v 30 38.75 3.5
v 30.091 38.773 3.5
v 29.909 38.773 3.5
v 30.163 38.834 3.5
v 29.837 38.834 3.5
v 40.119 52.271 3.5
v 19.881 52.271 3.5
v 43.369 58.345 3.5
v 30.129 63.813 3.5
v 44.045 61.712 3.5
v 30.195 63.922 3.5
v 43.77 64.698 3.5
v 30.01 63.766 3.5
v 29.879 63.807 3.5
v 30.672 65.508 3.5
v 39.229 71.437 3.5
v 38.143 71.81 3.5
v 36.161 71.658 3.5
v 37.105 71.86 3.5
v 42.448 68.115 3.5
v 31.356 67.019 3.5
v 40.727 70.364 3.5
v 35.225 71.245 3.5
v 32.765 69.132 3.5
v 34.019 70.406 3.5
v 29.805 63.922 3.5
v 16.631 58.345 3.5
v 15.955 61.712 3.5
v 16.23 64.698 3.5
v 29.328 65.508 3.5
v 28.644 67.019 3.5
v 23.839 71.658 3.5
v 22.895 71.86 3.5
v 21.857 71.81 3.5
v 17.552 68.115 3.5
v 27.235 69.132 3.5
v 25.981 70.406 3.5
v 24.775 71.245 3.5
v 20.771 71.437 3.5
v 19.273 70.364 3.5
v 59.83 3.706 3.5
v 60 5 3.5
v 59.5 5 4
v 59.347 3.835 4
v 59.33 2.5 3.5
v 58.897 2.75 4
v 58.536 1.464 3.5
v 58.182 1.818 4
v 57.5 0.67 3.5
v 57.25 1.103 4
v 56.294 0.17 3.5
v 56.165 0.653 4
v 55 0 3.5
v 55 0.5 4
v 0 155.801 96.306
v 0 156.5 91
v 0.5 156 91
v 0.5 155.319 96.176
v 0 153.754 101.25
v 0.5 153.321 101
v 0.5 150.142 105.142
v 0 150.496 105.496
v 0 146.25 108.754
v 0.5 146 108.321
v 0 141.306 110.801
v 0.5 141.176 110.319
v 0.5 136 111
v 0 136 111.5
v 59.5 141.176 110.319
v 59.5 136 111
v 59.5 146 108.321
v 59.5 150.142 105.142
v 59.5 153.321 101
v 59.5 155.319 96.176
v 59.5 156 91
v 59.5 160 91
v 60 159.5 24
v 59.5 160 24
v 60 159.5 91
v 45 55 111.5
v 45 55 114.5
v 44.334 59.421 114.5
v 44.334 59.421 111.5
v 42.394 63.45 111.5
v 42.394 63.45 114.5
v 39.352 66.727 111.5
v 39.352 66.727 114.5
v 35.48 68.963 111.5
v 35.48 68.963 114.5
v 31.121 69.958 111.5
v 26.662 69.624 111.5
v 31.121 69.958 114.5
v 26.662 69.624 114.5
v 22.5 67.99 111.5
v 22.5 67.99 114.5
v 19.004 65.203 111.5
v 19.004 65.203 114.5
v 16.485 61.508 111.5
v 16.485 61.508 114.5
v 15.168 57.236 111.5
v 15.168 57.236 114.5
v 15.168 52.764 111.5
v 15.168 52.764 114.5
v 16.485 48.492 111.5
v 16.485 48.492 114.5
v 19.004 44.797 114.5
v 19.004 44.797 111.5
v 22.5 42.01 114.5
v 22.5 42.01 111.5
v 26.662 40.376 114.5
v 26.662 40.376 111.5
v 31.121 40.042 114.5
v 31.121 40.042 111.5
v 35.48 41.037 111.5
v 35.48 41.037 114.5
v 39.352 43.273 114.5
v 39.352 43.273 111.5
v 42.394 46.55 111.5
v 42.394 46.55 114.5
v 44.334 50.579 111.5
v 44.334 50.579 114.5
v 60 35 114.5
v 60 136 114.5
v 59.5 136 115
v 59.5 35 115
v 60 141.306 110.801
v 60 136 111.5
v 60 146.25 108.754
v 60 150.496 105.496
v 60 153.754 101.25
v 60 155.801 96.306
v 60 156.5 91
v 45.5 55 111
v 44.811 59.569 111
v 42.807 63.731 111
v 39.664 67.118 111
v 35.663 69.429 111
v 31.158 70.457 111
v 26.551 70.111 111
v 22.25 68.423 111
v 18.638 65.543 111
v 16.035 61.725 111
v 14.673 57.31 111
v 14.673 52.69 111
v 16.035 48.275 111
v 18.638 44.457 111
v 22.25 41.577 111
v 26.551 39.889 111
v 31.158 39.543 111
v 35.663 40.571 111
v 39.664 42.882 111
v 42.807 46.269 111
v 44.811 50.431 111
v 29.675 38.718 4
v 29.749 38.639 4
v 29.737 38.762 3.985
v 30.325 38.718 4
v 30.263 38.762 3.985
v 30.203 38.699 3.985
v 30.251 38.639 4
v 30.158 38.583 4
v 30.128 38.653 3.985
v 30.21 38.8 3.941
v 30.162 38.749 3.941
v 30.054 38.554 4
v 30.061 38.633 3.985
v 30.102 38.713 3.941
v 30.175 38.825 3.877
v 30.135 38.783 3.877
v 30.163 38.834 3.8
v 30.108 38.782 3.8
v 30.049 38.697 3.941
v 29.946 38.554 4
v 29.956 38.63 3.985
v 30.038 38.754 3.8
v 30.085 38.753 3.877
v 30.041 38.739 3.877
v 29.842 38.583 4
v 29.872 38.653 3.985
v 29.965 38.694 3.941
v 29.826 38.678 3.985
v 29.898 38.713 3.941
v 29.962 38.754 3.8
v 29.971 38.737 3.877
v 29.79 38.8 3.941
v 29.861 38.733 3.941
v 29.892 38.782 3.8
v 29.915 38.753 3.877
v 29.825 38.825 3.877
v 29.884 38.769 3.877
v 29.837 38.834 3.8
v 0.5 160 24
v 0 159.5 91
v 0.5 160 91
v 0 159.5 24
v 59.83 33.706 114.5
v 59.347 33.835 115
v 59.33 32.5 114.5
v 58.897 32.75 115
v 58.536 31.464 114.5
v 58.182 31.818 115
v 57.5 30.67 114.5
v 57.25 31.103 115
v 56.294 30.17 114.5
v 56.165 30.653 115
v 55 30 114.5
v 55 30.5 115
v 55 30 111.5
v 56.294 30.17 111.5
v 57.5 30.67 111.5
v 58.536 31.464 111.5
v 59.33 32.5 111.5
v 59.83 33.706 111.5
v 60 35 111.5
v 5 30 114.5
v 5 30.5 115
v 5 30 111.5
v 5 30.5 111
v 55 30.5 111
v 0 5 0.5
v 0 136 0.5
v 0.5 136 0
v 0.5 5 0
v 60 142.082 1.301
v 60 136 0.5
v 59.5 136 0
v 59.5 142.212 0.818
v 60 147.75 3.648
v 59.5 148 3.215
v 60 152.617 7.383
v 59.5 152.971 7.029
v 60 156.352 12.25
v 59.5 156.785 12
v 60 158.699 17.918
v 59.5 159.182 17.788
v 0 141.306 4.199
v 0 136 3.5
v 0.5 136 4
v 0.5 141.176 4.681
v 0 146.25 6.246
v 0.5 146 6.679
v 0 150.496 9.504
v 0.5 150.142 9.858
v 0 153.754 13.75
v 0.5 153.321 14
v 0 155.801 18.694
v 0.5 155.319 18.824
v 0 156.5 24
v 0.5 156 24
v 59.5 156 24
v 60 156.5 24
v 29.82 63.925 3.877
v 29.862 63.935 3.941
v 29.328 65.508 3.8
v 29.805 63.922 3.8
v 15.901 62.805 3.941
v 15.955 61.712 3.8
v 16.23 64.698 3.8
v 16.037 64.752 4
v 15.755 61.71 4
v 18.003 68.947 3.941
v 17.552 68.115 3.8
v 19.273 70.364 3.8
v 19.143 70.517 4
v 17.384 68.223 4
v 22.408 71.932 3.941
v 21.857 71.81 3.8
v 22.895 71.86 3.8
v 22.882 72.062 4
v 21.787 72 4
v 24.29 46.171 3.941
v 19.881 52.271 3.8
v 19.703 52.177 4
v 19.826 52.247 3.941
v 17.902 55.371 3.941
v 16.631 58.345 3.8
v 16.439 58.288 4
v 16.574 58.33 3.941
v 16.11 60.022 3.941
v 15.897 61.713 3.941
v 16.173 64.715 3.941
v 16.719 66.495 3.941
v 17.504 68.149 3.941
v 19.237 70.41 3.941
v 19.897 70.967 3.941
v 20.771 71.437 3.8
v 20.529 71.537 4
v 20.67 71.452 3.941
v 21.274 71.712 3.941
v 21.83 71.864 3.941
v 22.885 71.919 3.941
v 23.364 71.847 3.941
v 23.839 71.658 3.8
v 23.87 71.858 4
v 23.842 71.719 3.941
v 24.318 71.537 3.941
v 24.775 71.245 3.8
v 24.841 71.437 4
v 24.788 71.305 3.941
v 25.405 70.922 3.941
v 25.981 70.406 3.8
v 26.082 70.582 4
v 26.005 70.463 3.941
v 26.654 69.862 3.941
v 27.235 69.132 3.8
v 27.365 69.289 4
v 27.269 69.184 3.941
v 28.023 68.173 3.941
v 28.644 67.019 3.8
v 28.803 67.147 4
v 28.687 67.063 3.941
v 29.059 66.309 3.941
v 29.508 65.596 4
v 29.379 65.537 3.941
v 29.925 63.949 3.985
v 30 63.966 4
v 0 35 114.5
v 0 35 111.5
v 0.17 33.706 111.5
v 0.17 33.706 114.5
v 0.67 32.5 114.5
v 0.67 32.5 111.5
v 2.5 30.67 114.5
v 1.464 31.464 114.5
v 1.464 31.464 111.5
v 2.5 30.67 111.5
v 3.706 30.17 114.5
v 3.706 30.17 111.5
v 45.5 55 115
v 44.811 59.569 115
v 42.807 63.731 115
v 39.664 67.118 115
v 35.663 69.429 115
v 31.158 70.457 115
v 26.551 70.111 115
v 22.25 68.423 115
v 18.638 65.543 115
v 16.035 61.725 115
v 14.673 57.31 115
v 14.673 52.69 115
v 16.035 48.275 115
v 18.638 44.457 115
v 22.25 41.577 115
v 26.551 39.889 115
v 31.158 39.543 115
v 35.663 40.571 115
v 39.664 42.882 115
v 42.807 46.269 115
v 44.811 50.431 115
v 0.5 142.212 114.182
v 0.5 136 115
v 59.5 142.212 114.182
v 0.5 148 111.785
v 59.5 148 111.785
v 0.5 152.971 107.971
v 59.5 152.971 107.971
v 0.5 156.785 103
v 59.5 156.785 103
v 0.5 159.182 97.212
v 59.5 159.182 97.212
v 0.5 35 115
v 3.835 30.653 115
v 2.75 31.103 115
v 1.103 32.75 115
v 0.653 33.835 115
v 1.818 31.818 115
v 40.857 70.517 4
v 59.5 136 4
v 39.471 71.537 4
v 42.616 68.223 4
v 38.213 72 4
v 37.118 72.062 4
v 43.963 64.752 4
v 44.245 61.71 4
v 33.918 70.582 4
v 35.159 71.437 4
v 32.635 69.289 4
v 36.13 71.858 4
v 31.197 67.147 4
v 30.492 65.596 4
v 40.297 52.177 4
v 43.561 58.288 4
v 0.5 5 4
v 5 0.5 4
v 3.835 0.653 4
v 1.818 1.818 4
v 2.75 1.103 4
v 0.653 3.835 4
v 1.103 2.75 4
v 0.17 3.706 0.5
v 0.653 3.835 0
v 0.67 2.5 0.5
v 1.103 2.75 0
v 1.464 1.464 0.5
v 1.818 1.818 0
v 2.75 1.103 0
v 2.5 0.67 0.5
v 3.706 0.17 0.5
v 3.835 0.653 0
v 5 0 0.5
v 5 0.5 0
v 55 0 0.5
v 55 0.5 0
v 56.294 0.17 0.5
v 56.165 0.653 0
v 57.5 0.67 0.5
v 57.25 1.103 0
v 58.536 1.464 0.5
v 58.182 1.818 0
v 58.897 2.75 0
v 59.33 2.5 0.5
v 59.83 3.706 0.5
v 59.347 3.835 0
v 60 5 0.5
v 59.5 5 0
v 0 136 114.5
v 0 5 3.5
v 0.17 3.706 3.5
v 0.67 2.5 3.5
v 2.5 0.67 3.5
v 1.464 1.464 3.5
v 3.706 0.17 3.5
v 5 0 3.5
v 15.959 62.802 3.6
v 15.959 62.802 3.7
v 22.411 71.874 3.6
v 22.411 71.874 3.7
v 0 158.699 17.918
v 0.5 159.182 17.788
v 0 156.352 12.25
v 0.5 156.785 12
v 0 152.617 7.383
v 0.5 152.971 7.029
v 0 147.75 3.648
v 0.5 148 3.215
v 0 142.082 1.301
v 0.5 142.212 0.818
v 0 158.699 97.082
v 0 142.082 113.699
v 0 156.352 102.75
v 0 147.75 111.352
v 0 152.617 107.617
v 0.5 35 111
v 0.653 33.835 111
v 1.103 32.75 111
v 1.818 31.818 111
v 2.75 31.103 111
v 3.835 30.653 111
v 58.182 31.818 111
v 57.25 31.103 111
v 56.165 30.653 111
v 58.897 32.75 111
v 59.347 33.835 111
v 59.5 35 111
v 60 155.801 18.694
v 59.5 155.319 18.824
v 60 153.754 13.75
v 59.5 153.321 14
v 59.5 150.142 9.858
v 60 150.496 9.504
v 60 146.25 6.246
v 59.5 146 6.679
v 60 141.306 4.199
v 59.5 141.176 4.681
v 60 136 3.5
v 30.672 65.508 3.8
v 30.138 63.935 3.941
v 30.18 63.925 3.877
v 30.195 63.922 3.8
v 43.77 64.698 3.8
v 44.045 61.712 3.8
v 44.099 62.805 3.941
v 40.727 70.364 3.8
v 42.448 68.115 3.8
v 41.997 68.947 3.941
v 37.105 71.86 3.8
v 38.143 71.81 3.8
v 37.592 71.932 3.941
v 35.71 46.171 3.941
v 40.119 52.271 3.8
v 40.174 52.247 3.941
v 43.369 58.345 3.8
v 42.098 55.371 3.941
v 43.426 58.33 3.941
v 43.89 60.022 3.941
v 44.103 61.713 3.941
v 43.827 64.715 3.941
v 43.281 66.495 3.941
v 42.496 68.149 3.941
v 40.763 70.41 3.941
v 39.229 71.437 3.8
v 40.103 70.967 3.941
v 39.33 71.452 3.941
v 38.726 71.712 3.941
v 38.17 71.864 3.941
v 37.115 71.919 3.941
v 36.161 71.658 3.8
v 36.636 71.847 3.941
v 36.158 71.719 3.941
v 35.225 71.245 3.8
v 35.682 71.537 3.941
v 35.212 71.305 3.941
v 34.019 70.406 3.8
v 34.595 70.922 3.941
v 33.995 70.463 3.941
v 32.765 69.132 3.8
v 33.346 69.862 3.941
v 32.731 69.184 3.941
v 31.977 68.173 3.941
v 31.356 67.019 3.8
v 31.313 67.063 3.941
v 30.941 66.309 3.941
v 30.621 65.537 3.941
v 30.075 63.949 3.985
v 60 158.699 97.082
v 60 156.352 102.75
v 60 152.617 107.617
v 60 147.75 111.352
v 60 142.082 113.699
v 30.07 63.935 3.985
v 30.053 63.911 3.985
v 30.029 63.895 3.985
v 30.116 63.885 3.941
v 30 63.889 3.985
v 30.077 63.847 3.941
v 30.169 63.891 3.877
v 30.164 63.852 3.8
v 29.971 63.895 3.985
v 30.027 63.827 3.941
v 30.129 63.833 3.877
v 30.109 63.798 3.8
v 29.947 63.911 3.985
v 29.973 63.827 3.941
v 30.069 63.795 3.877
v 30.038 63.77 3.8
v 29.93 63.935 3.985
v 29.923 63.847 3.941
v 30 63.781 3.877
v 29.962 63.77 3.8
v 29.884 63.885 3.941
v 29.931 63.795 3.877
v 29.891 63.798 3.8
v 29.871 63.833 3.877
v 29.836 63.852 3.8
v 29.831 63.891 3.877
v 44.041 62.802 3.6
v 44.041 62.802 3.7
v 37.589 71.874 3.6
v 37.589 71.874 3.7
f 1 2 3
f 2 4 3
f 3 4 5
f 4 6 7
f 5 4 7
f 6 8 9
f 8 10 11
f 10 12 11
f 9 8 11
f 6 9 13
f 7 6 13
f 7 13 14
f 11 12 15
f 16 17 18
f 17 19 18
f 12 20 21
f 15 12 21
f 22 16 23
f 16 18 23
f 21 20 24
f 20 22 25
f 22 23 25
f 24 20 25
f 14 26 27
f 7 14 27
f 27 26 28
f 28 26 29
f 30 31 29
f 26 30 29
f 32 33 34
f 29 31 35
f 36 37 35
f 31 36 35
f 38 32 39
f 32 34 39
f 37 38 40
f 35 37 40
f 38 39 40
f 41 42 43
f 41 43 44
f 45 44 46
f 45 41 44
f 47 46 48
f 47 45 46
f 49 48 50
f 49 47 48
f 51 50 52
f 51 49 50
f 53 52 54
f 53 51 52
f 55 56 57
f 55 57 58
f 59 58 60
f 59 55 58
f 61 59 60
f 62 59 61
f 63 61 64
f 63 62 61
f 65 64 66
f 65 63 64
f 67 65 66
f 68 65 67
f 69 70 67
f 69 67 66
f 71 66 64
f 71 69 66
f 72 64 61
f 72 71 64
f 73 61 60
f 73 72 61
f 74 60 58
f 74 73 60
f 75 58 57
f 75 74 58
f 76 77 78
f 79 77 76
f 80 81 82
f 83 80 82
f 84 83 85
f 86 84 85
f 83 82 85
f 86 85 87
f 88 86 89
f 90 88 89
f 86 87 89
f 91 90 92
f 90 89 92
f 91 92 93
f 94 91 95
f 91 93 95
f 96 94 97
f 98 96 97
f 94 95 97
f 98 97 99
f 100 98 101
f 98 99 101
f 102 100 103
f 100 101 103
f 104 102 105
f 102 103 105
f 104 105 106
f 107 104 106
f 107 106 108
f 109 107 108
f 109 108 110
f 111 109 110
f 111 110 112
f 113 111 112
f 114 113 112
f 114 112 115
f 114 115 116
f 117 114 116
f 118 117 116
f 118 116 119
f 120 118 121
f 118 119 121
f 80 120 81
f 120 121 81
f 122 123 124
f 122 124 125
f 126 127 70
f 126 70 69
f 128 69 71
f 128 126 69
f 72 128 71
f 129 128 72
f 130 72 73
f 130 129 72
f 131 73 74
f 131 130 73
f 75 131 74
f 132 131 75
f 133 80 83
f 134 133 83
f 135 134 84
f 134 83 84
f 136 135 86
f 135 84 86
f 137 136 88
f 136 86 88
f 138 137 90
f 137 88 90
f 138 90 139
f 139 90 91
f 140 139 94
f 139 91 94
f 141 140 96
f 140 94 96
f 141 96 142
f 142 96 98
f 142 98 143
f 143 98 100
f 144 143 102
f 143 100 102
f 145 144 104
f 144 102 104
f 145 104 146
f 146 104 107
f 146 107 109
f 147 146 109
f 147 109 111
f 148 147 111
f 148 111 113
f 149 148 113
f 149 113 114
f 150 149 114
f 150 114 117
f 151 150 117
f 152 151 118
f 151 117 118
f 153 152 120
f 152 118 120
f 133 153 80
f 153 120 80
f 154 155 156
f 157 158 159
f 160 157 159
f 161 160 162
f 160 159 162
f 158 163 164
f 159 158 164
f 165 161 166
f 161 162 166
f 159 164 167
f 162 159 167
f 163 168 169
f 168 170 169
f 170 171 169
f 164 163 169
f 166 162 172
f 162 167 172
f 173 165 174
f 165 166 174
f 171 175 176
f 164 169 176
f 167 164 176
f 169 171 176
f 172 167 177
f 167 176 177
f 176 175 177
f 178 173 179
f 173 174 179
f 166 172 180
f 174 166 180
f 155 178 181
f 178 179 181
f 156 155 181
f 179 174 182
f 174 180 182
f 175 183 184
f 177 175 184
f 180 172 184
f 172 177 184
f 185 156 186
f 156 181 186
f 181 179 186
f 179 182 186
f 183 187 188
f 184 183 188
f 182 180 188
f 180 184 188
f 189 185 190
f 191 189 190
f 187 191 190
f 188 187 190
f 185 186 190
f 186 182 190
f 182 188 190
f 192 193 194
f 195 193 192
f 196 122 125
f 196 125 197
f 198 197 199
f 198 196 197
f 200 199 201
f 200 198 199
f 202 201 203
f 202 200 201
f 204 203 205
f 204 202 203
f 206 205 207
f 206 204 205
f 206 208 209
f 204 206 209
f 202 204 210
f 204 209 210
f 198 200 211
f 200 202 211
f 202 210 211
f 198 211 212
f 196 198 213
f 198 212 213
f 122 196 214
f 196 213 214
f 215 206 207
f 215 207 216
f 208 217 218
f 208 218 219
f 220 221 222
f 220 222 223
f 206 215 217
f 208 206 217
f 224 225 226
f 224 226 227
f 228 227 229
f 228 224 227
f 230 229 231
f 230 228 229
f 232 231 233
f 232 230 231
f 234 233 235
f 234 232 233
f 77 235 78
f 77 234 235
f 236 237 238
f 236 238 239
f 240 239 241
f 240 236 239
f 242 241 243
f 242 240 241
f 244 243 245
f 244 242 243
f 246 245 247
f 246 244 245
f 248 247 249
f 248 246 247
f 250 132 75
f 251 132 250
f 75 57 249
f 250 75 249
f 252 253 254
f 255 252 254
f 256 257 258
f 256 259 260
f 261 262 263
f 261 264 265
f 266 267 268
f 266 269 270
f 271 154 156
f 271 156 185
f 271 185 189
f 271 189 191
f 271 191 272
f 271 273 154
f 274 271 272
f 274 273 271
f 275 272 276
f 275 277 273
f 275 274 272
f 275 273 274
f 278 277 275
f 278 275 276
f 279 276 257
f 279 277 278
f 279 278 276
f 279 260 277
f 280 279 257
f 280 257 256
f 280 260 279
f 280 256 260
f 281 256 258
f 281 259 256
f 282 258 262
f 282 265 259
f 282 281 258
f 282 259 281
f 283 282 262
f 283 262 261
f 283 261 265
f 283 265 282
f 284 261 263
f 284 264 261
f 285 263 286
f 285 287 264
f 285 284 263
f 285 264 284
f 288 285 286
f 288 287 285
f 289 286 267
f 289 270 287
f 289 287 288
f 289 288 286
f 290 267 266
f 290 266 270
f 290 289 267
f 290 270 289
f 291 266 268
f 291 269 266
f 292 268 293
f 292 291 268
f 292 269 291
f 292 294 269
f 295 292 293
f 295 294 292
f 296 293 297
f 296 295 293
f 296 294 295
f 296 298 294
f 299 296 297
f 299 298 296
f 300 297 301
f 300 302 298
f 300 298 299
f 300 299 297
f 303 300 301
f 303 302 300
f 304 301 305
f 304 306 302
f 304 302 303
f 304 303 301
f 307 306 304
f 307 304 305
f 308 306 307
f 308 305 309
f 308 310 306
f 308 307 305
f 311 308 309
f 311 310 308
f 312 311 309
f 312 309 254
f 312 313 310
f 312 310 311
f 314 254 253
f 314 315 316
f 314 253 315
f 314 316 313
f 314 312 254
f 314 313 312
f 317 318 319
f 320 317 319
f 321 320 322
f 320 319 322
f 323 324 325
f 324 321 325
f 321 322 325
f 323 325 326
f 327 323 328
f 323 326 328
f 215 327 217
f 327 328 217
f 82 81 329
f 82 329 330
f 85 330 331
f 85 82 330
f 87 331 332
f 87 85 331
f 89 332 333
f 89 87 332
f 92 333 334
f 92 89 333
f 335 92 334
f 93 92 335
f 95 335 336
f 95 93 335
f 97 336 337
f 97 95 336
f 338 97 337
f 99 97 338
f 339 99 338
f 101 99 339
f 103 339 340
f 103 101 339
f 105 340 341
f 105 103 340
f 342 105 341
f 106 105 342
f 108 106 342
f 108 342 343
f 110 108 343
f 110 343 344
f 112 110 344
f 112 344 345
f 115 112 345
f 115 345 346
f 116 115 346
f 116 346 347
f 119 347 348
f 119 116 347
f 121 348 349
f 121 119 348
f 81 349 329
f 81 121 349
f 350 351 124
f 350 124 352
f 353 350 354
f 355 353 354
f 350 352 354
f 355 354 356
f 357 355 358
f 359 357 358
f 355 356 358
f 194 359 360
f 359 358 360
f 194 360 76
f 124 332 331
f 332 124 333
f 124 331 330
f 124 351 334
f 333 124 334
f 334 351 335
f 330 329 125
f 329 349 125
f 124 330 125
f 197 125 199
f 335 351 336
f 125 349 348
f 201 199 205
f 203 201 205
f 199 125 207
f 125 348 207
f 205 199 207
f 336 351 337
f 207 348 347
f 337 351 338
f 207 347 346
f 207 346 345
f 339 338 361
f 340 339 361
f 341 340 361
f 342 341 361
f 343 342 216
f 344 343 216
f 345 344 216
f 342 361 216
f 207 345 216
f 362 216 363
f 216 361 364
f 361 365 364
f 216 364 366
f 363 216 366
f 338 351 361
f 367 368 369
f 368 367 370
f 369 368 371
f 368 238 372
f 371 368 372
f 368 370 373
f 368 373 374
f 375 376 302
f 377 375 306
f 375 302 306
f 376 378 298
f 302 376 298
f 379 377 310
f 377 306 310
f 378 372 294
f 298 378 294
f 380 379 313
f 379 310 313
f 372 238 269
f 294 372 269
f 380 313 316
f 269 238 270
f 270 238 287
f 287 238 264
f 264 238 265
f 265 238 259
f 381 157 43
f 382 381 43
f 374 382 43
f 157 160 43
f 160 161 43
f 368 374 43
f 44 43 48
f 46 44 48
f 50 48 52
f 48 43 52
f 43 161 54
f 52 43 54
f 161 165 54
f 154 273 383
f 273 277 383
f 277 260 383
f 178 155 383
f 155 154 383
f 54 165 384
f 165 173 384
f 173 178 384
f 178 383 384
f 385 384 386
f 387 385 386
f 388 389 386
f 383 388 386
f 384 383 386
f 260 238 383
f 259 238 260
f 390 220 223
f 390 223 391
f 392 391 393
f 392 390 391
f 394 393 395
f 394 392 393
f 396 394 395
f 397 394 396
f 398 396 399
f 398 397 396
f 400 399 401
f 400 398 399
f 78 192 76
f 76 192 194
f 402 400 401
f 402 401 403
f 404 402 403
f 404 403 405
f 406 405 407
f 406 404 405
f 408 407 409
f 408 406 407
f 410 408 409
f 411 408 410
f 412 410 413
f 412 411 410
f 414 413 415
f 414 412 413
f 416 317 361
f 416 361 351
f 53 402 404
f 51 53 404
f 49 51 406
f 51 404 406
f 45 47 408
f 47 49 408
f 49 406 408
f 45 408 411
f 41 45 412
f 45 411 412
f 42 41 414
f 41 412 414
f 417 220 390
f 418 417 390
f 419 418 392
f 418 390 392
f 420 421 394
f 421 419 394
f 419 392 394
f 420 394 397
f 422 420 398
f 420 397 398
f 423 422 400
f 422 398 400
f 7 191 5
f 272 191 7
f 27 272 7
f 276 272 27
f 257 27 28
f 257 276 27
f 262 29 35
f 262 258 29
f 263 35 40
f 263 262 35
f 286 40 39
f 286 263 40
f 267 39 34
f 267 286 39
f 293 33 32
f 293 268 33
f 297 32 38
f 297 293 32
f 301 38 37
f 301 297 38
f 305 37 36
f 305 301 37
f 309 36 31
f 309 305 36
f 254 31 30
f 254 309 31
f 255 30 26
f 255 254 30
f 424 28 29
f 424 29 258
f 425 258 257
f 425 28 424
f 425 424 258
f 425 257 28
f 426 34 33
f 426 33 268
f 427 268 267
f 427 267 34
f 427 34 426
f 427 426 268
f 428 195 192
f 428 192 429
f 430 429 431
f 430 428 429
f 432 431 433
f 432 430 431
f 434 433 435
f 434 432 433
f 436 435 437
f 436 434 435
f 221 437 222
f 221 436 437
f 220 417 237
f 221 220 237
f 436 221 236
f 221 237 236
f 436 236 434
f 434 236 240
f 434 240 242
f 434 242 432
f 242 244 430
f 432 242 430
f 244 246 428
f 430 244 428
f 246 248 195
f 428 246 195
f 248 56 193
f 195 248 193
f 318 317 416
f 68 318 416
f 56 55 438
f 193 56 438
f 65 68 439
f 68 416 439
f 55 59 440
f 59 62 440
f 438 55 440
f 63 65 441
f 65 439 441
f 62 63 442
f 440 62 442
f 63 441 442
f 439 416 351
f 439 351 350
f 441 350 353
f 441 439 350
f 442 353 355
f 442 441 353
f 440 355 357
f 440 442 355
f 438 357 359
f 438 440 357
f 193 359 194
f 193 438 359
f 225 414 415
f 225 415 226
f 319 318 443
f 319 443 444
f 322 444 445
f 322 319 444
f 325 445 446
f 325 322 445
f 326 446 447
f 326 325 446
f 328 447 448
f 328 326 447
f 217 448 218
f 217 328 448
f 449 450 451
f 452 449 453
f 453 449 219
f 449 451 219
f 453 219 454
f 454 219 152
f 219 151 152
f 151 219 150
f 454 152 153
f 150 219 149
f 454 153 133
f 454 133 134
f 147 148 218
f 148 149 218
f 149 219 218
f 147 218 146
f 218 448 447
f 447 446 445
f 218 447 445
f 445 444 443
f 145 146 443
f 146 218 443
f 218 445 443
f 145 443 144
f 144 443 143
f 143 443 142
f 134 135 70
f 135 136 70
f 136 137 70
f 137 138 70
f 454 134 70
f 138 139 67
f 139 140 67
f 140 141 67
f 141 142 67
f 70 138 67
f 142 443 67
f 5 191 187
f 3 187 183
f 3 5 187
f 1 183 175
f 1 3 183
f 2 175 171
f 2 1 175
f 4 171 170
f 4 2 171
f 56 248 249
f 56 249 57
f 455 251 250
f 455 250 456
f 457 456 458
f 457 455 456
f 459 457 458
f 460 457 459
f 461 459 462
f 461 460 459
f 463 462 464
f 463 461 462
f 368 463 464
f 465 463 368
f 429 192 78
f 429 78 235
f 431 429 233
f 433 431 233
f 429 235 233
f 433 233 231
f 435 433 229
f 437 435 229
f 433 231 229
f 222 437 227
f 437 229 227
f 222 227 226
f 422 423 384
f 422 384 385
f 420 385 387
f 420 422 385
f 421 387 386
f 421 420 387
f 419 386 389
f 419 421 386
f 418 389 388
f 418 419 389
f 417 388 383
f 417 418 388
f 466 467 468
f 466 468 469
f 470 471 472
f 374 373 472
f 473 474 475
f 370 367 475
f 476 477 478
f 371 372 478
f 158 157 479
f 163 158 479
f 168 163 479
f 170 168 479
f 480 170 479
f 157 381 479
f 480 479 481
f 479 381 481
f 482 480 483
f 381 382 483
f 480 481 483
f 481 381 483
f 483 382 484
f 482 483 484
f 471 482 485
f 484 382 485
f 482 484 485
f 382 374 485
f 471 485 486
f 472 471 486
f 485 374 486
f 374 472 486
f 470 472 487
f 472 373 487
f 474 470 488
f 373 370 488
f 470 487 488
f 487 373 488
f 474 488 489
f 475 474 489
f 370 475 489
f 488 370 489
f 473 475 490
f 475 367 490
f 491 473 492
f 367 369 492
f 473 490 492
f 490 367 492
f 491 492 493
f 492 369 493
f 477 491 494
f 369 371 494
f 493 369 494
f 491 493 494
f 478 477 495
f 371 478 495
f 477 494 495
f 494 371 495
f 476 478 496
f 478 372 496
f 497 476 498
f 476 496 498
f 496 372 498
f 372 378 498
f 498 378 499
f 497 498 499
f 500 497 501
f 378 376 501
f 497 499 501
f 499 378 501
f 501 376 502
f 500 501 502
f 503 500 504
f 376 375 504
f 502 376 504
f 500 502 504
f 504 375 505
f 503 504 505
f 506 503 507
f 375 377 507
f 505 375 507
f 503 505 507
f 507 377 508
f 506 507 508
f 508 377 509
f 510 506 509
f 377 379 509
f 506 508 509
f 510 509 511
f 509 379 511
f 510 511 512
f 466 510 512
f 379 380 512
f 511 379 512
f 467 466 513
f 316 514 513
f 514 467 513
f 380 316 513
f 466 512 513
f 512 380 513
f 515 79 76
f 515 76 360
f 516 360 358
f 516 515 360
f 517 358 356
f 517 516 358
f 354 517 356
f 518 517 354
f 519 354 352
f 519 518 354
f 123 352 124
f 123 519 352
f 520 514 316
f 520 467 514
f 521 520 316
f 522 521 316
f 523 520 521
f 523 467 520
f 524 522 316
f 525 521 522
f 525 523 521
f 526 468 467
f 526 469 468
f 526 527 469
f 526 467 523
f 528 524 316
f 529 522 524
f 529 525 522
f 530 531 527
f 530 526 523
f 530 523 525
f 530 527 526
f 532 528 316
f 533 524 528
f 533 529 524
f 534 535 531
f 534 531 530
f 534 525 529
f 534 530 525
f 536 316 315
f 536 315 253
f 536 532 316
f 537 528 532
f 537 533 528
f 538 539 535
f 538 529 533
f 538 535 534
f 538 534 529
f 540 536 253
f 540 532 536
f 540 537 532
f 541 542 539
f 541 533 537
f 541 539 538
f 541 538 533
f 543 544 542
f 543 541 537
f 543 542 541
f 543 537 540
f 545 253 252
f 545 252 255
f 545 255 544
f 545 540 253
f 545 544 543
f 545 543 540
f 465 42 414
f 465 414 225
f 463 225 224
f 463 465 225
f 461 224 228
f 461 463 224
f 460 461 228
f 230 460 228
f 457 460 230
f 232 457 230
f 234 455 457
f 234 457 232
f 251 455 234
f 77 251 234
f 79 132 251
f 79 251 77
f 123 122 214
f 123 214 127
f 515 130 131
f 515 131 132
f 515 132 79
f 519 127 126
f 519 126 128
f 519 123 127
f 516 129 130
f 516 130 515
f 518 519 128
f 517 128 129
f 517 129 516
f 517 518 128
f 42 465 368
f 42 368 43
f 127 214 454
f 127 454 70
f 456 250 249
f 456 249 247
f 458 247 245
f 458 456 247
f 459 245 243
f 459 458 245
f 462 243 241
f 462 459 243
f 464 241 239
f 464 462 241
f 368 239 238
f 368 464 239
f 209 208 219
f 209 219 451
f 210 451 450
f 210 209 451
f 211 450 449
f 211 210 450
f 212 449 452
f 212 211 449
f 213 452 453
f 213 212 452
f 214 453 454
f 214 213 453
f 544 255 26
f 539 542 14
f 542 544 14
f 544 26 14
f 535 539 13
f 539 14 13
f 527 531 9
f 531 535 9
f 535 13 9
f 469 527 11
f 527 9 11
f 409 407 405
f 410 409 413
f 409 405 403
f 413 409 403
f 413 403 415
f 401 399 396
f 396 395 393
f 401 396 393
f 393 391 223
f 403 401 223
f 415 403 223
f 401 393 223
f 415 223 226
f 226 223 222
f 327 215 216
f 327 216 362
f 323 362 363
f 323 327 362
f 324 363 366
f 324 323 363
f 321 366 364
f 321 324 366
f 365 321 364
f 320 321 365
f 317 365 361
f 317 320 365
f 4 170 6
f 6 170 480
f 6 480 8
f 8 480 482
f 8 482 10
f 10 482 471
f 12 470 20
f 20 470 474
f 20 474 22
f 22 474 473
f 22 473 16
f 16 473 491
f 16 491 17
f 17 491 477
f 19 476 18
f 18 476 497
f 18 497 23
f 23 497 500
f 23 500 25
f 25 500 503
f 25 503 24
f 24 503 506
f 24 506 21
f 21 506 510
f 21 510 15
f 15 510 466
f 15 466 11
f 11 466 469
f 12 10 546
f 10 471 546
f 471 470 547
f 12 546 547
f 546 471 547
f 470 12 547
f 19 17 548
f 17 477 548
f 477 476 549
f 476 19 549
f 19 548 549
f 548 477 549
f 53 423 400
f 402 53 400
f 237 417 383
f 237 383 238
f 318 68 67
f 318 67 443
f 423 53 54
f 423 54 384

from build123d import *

# Parameters (mm, degrees)
F1_DEPTH = 60
F2_R     = 20
F3_R     = 24
F4_R     = 5
F5_R     = 15
F6_DEPTH = 4
F7_SIZE  = 0.5
F9_DEPTH = 0.5
F10_R    = 0.2


with BuildPart() as f1:
    # F0 (on Right) → F1 (new body)
    with BuildSketch(Plane.YZ):
        Polygon((0, 4), (0, 0), (160, 0), (160, 115), (30, 115), (30, 111), (156, 111), (156, 4), align=None)
    extrude(amount=F1_DEPTH)

    # F2
    f2_edges = [f1.edges().sort_by_distance(p)[0] for p in [
        (30, 156, 111),
        (30, 156, 4),
    ]]
    fillet(f2_edges, radius=F2_R)

    # F3
    f3_edges = [f1.edges().sort_by_distance(p)[0] for p in [
        (30, 160, 115),
        (30, 160, 0),
    ]]
    fillet(f3_edges, radius=F3_R)

    # F4
    f4_edges = [f1.edges().sort_by_distance(p)[0] for p in [
        (0, 30, 113),
        (60, 30, 113),
        (0, 0, 2),
        (60, 0, 2),
    ]]
    fillet(f4_edges, radius=F4_R)

    # F5 (on face) → F6 (cut, through all)
    with BuildSketch(Plane.XY.offset(115)):
        with Locations((30, 55)):
            Circle(F5_R)
    extrude(amount=-F6_DEPTH, mode=Mode.SUBTRACT)

    # F7
    f7_edges = [f1.edges().sort_by_distance(p)[0] for p in [
        (45, 55, 113),
        (15, 55, 115),
        (15, 55, 111),
        (60, 85.5, 115),
        (60, 35, 113),
        (60, 152.970563, 107.970563),
        (60, 85.5, 111),
        (60, 160, 57.5),
        (60, 150.142136, 105.142136),
        (60, 152.970563, 7.029437),
        (60, 156, 57.5),
        (60, 70.5, 0),
        (60, 150.142136, 9.857864),
        (60, 5, 2),
        (60, 70.5, 4),
    ]]
    chamfer(f7_edges, length=F7_SIZE)

    # F8 (on face) → F9 (cut)
    with BuildSketch(Plane.XY.offset(4)):
        with BuildLine():
            add(Edge.make_bspline(
                [(30, 38.6065185261), (21.9971418158, 49.8237009627), (11.5280524688, 59.8035321959), (22.1873581544, 76.5164287378), (29.4813248377, 67.3441461739), (30, 62.7757276542)],
                knots=[0, 0, 0, 0, 0.4382892649, 0.714767061, 1, 1, 1, 1], degree=3))
            add(Edge.make_bspline(
                [(30, 38.6065185261), (38.0028581842, 49.8237009627), (48.4719475312, 59.8035321959), (37.8126418456, 76.5164287378), (30.5186751623, 67.3441461739), (30, 62.7757276542)],
                knots=[0, 0, 0, 0, 0.4382892649, 0.714767061, 1, 1, 1, 1], degree=3))
        make_face()
    extrude(amount=-F9_DEPTH, mode=Mode.SUBTRACT)

    # F10
    f10_edges = [f1.edges().sort_by_distance(p)[0] for p in [
        (30, 62.775728, 3.75),
        (43.981873, 60.959585, 4),
        (16.018127, 60.959585, 4),
        (30, 38.606519, 3.75),
    ]]
    fillet(f10_edges, radius=F10_R)


solid = f1.part
